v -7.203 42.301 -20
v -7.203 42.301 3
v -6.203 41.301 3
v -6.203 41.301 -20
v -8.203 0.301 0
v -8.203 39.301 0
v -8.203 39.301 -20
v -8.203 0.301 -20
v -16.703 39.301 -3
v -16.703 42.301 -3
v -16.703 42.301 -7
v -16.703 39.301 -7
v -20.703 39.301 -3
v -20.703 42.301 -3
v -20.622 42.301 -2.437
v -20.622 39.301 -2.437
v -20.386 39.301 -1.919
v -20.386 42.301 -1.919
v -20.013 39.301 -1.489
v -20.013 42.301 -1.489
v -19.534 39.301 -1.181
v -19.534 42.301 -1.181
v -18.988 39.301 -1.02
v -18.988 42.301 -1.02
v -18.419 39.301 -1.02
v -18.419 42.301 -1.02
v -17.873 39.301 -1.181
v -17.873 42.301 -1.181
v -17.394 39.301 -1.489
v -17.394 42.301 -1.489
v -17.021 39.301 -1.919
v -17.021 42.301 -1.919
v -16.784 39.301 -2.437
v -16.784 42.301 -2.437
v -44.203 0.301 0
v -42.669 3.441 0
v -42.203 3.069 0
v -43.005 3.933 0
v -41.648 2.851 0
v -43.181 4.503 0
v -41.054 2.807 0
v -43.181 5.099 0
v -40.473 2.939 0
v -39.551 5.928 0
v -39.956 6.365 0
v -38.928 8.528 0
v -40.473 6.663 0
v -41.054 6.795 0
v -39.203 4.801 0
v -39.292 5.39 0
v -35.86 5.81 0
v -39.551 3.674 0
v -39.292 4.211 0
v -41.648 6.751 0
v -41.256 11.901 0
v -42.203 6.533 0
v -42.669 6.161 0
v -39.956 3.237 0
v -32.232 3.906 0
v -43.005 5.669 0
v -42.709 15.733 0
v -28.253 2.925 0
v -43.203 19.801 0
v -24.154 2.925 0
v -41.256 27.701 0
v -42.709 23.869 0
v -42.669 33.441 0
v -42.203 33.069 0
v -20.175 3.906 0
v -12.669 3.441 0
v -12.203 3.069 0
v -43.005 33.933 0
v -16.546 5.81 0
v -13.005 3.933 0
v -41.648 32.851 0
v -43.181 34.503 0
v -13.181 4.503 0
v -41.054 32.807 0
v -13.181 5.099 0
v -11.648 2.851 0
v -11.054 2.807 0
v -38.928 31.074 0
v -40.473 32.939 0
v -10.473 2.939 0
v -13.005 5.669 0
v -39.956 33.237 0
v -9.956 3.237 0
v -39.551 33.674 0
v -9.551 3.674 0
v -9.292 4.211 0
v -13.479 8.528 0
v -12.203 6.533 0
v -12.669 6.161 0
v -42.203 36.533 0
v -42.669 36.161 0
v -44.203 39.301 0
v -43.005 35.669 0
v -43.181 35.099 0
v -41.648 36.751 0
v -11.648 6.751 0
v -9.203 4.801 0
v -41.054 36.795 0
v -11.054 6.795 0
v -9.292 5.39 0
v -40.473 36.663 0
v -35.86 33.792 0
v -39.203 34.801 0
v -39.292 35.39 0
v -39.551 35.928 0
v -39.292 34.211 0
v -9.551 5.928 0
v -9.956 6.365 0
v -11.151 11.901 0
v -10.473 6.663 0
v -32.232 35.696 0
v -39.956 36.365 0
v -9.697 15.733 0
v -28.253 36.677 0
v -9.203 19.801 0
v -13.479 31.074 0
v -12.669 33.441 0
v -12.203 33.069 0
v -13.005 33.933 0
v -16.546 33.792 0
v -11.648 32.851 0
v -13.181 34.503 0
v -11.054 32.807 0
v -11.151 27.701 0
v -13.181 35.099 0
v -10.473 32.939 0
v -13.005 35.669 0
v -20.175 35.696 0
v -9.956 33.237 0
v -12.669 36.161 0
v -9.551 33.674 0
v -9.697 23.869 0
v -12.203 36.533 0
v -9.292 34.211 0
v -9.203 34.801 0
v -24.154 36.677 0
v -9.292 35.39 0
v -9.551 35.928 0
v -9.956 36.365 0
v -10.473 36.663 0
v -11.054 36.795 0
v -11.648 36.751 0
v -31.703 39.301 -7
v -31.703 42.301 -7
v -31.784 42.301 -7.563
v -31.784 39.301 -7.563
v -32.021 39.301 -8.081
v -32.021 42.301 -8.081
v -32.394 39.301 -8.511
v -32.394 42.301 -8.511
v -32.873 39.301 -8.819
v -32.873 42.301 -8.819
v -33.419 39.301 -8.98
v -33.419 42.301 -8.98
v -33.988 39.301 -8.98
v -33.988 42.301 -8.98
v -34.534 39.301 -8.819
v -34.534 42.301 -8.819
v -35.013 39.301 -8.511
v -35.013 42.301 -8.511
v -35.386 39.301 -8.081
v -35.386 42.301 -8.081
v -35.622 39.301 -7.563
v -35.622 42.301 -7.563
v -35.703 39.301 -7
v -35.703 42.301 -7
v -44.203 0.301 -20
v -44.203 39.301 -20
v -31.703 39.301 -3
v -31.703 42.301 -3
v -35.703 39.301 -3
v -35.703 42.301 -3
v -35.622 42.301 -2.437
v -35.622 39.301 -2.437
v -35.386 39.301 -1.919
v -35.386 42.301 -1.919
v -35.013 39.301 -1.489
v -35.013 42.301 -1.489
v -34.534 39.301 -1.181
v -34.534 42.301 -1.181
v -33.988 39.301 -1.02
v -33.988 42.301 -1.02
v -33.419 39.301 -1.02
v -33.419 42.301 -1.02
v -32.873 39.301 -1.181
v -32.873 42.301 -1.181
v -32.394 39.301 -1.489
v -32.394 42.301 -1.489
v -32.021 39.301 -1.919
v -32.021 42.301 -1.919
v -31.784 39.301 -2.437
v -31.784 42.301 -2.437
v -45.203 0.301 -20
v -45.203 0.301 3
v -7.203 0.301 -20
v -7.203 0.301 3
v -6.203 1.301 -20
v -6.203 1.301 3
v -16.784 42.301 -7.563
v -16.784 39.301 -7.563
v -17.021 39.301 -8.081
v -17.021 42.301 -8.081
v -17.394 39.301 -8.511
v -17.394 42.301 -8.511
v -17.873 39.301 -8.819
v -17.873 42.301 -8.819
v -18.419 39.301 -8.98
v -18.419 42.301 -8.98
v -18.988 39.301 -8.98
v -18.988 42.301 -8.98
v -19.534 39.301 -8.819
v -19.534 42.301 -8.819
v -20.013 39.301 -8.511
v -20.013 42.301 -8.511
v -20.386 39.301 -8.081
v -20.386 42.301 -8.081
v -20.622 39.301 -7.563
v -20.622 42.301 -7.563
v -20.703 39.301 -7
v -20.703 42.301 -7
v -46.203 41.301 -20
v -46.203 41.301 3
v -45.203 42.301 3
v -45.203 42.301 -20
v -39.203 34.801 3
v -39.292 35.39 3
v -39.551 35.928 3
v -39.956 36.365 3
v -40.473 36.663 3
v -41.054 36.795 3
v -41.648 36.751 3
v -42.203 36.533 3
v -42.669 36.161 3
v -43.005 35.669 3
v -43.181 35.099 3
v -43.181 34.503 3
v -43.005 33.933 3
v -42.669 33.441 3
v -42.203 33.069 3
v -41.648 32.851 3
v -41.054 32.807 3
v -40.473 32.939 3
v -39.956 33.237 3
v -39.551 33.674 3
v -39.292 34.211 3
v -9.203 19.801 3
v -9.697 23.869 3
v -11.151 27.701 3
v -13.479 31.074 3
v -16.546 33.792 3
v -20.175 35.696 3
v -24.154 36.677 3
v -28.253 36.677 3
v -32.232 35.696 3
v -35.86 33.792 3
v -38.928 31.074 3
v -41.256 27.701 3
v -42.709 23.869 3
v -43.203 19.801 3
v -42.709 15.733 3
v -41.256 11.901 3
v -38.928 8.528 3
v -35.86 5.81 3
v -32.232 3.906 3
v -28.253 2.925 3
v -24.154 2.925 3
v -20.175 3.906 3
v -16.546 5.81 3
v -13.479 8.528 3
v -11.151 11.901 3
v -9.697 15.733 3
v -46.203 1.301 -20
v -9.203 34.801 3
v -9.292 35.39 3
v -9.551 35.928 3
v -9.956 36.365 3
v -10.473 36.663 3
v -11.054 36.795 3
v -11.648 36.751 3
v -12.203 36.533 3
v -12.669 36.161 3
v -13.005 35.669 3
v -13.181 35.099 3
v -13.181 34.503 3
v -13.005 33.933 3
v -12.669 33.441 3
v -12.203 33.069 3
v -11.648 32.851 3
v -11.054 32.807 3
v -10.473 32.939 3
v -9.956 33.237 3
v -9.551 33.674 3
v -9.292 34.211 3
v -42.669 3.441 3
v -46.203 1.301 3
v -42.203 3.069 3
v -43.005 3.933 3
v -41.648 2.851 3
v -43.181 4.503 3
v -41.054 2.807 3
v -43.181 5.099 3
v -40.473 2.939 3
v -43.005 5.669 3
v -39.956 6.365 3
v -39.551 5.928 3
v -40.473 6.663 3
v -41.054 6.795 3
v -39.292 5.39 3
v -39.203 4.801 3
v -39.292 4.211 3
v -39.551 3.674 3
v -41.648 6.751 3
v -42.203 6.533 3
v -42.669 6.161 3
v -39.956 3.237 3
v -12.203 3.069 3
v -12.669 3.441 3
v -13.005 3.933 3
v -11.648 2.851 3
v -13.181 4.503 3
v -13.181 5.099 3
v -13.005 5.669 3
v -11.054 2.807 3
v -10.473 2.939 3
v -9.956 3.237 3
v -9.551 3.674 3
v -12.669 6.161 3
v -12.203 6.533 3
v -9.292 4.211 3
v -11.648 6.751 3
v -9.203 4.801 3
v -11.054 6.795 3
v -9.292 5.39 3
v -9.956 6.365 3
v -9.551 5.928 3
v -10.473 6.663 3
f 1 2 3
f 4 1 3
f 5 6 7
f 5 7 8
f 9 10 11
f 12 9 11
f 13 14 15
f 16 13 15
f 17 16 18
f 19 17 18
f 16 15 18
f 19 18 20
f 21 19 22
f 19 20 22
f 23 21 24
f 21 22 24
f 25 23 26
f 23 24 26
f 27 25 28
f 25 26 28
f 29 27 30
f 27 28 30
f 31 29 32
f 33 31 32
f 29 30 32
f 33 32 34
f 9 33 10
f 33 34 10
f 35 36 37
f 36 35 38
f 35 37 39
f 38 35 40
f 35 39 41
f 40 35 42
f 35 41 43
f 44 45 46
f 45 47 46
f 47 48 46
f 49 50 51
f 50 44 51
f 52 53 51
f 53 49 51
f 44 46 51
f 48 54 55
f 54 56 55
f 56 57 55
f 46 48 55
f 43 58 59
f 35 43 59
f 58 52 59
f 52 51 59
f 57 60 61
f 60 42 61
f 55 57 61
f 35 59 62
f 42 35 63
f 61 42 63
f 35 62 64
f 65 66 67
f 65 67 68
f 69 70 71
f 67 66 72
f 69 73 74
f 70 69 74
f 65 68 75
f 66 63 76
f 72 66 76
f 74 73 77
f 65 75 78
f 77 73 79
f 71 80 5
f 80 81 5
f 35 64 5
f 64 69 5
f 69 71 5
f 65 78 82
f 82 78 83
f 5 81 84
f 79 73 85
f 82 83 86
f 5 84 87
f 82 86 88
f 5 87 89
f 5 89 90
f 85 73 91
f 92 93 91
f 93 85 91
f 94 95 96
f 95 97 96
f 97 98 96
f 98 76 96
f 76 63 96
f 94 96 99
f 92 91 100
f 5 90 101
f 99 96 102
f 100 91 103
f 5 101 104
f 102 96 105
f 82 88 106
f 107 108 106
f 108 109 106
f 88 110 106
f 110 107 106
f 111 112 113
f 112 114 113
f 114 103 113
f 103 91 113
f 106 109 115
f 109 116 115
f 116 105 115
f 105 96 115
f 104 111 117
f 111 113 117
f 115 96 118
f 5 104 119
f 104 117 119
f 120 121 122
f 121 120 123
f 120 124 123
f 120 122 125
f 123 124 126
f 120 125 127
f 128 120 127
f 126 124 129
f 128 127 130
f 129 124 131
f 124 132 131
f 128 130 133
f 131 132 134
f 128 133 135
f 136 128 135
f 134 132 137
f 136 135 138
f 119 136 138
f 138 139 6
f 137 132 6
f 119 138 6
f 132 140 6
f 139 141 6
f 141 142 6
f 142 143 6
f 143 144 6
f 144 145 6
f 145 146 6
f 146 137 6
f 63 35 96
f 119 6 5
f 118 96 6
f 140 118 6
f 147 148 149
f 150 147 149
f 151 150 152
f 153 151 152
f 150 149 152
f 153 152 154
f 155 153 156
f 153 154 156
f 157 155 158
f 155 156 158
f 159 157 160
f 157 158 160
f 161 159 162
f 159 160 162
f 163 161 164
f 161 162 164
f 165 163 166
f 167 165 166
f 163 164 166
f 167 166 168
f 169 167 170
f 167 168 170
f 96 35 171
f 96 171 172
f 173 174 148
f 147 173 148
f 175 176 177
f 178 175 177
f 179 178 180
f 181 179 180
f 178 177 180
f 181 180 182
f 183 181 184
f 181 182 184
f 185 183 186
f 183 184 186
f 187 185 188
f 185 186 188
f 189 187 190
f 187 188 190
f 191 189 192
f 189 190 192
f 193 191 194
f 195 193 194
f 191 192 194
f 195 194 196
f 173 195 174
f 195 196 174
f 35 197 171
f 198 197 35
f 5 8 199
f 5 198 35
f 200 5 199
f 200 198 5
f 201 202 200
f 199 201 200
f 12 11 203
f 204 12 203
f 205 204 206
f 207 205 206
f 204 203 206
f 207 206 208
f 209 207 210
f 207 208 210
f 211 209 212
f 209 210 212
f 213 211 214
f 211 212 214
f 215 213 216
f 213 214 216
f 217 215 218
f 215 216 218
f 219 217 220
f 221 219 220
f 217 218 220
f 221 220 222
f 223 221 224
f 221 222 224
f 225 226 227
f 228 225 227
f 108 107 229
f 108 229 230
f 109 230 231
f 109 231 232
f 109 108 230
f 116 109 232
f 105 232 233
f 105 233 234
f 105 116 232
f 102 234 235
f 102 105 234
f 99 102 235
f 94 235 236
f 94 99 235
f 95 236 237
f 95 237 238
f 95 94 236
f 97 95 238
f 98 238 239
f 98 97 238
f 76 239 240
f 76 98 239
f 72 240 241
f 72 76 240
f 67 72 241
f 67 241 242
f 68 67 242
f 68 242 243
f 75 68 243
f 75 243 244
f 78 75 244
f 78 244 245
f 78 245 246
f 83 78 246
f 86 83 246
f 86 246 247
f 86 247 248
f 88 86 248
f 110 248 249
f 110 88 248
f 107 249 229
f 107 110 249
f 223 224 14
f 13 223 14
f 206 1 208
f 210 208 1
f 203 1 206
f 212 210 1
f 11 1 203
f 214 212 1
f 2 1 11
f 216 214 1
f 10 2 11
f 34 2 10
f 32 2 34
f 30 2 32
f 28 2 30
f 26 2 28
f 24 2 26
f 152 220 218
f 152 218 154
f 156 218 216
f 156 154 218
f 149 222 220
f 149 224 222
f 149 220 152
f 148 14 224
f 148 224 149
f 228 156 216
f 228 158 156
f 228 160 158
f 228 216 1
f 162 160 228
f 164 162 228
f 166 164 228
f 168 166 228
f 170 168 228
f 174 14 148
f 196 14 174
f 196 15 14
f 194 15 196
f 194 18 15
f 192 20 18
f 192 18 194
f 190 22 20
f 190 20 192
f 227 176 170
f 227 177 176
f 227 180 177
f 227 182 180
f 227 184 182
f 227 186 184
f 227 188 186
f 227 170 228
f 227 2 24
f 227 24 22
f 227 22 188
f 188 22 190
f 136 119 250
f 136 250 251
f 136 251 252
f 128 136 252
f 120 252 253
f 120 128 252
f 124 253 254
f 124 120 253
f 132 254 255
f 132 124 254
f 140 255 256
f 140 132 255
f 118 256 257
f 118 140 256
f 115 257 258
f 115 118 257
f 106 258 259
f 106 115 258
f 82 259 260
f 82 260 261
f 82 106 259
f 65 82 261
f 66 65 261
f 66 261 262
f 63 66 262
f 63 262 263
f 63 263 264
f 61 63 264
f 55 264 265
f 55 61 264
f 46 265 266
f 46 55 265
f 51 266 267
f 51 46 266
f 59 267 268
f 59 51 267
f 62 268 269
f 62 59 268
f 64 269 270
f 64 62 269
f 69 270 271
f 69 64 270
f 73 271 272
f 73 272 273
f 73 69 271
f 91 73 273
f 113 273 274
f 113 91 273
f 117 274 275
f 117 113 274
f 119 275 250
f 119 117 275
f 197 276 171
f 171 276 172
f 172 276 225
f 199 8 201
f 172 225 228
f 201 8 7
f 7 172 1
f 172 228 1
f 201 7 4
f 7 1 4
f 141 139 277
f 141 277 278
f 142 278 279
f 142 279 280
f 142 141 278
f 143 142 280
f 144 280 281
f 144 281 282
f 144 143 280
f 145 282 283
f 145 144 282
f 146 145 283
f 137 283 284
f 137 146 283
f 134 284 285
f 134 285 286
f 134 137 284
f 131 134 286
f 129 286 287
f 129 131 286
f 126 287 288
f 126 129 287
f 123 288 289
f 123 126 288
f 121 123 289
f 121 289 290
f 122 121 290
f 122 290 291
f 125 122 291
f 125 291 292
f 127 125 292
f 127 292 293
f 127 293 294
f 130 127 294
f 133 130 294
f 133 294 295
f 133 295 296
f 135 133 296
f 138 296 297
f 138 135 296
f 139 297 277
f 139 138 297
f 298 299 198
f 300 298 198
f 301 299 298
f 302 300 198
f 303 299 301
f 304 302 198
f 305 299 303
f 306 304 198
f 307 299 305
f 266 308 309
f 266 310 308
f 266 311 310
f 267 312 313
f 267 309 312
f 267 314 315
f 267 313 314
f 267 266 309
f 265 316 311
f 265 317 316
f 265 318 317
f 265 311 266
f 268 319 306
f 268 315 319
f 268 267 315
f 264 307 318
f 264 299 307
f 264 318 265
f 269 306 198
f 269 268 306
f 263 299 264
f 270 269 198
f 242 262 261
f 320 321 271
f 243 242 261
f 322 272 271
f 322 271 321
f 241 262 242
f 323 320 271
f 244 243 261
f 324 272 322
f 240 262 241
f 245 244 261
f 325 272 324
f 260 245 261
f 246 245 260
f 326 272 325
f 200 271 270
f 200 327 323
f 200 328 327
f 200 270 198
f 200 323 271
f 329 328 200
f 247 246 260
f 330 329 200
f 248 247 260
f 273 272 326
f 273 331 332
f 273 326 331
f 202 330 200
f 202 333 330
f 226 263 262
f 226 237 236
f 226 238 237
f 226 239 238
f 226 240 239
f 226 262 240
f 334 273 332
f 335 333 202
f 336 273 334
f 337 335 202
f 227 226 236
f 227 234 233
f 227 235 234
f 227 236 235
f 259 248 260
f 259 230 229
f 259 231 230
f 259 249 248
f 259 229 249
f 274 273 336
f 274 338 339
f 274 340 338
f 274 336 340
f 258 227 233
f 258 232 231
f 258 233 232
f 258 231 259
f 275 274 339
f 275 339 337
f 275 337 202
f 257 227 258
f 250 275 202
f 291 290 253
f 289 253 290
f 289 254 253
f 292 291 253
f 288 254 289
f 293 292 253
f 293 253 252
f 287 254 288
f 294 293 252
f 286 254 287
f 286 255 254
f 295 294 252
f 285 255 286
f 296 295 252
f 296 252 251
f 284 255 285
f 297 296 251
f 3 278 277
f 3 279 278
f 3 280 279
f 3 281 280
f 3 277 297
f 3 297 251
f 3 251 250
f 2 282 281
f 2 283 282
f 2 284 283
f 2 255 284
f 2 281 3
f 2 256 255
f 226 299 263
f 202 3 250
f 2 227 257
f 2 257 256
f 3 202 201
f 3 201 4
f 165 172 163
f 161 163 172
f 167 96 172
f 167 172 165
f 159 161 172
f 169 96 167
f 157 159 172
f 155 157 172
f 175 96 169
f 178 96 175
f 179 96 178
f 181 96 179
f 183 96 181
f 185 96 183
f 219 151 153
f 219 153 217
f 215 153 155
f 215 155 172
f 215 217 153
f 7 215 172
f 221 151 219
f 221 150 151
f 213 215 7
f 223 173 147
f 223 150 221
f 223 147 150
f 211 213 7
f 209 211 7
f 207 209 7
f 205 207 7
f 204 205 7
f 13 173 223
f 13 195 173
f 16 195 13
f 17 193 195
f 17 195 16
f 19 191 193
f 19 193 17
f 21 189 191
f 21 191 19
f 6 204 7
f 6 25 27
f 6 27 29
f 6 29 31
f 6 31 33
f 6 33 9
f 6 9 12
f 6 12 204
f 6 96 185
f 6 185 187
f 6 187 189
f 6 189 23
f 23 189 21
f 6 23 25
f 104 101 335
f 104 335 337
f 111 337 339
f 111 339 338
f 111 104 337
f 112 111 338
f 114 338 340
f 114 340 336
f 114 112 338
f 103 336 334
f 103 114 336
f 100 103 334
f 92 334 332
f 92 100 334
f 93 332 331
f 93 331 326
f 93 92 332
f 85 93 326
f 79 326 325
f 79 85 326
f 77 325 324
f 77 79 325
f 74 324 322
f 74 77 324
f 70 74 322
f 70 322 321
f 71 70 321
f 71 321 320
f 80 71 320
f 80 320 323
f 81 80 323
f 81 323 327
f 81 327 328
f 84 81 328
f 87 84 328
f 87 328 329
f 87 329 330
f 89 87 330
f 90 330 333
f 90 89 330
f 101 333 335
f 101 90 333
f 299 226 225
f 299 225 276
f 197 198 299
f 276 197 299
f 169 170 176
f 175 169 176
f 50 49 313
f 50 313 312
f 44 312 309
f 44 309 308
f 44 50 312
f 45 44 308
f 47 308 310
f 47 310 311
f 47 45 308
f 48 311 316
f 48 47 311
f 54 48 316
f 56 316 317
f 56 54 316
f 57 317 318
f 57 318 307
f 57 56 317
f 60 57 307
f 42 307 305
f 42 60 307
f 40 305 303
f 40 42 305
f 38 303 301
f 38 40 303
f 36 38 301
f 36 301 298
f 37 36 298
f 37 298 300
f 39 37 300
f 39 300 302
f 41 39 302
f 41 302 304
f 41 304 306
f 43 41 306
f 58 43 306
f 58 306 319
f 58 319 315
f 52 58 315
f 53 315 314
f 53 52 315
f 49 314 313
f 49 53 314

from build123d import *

# Parameters (mm, degrees)
SKETCH_1_W          = 40
SKETCH_1_H          = 42
SKETCH_1_R          = 2
SKETCH_1_R_2        = 17
EXTRUDE_1_DEPTH     = 3
EXTRUDE_2_DEPTH     = 20
CUT_EXTRUDE_1_DEPTH = 25
CUT_EXTRUDE_2_DEPTH = 4


with BuildPart() as part:
    # 草图1 → 凸台-拉伸1 (new body)
    with BuildSketch(Plane.XY):
        with Locations((-26.203389279, 21.300914244)):
            Rectangle(SKETCH_1_W, SKETCH_1_H)
        with Locations((-41.203389279, 34.800914244)):
            Circle(SKETCH_1_R, mode=Mode.SUBTRACT)
        with Locations((-11.203389279, 34.800914244)):
            Circle(SKETCH_1_R, mode=Mode.SUBTRACT)
        with Locations((-41.203389279, 4.800914244)):
            Circle(SKETCH_1_R, mode=Mode.SUBTRACT)
        with Locations((-11.203389279, 4.800914244)):
            Circle(SKETCH_1_R, mode=Mode.SUBTRACT)
        with Locations((-26.203389279, 19.800914244)):
            Circle(SKETCH_1_R_2, mode=Mode.SUBTRACT)
    extrude(amount=EXTRUDE_1_DEPTH)

    # 草图2 → 凸台-拉伸2 (add)
    with BuildSketch(Plane(origin=(0, 0, 0), x_dir=(-1, 0, 0), z_dir=(0, 0, -1))):
        Polygon((6.203389279, 42.300914244), (46.203389279, 42.300914244), (46.203389279, 0.300914244), (44.203389279, 0.300914244), (44.203389279, 39.300914244), (8.203389279, 39.300914244), (8.203389279, 0.300914244), (6.203389279, 0.300914244), align=None)
    extrude(amount=EXTRUDE_2_DEPTH)

    # 草图3 → 切除-拉伸1 (cut)
    with BuildSketch(Plane.XY.offset(3)):
        Polygon((-45.203389279, 42.300914244), (-46.203389279, 42.300914244), (-46.203389279, 41.300914244), align=None)
        Polygon((-6.203389279, 42.300914244), (-7.203389279, 42.300914244), (-6.203389279, 41.300914244), align=None)
        Polygon((-45.203389279, 0.300914244), (-46.203389279, 1.300914244), (-46.203389279, 0.300914244), align=None)
        Polygon((-6.203389279, 0.300914244), (-6.203389279, 1.300914244), (-7.203389279, 0.300914244), align=None)
    extrude(amount=-CUT_EXTRUDE_1_DEPTH, mode=Mode.SUBTRACT)

    # 草图5 → 切除-拉伸2 (cut)
    with BuildSketch(Plane(origin=(0, 42.300914244, 0), x_dir=(1, 0, 0), z_dir=(0, 1, 0))):
        with BuildLine():
            Line((-35.703389279, 7), (-35.703389279, 3))
            ThreePointArc((-35.703389279, 3), (-33.703389279, 1), (-31.703389279, 3))
            Line((-31.703389279, 3), (-31.703389279, 7))
            ThreePointArc((-31.703389279, 7), (-33.703389279, 9), (-35.703389279, 7))
        make_face()
        with BuildLine():
            Line((-20.703389279, 7), (-20.703389279, 3))
            ThreePointArc((-20.703389279, 3), (-18.703389279, 1), (-16.703389279, 3))
            Line((-16.703389279, 3), (-16.703389279, 7))
            ThreePointArc((-16.703389279, 7), (-18.703389279, 9), (-20.703389279, 7))
        make_face()
    extrude(amount=-CUT_EXTRUDE_2_DEPTH, mode=Mode.SUBTRACT)


solid = part.part
